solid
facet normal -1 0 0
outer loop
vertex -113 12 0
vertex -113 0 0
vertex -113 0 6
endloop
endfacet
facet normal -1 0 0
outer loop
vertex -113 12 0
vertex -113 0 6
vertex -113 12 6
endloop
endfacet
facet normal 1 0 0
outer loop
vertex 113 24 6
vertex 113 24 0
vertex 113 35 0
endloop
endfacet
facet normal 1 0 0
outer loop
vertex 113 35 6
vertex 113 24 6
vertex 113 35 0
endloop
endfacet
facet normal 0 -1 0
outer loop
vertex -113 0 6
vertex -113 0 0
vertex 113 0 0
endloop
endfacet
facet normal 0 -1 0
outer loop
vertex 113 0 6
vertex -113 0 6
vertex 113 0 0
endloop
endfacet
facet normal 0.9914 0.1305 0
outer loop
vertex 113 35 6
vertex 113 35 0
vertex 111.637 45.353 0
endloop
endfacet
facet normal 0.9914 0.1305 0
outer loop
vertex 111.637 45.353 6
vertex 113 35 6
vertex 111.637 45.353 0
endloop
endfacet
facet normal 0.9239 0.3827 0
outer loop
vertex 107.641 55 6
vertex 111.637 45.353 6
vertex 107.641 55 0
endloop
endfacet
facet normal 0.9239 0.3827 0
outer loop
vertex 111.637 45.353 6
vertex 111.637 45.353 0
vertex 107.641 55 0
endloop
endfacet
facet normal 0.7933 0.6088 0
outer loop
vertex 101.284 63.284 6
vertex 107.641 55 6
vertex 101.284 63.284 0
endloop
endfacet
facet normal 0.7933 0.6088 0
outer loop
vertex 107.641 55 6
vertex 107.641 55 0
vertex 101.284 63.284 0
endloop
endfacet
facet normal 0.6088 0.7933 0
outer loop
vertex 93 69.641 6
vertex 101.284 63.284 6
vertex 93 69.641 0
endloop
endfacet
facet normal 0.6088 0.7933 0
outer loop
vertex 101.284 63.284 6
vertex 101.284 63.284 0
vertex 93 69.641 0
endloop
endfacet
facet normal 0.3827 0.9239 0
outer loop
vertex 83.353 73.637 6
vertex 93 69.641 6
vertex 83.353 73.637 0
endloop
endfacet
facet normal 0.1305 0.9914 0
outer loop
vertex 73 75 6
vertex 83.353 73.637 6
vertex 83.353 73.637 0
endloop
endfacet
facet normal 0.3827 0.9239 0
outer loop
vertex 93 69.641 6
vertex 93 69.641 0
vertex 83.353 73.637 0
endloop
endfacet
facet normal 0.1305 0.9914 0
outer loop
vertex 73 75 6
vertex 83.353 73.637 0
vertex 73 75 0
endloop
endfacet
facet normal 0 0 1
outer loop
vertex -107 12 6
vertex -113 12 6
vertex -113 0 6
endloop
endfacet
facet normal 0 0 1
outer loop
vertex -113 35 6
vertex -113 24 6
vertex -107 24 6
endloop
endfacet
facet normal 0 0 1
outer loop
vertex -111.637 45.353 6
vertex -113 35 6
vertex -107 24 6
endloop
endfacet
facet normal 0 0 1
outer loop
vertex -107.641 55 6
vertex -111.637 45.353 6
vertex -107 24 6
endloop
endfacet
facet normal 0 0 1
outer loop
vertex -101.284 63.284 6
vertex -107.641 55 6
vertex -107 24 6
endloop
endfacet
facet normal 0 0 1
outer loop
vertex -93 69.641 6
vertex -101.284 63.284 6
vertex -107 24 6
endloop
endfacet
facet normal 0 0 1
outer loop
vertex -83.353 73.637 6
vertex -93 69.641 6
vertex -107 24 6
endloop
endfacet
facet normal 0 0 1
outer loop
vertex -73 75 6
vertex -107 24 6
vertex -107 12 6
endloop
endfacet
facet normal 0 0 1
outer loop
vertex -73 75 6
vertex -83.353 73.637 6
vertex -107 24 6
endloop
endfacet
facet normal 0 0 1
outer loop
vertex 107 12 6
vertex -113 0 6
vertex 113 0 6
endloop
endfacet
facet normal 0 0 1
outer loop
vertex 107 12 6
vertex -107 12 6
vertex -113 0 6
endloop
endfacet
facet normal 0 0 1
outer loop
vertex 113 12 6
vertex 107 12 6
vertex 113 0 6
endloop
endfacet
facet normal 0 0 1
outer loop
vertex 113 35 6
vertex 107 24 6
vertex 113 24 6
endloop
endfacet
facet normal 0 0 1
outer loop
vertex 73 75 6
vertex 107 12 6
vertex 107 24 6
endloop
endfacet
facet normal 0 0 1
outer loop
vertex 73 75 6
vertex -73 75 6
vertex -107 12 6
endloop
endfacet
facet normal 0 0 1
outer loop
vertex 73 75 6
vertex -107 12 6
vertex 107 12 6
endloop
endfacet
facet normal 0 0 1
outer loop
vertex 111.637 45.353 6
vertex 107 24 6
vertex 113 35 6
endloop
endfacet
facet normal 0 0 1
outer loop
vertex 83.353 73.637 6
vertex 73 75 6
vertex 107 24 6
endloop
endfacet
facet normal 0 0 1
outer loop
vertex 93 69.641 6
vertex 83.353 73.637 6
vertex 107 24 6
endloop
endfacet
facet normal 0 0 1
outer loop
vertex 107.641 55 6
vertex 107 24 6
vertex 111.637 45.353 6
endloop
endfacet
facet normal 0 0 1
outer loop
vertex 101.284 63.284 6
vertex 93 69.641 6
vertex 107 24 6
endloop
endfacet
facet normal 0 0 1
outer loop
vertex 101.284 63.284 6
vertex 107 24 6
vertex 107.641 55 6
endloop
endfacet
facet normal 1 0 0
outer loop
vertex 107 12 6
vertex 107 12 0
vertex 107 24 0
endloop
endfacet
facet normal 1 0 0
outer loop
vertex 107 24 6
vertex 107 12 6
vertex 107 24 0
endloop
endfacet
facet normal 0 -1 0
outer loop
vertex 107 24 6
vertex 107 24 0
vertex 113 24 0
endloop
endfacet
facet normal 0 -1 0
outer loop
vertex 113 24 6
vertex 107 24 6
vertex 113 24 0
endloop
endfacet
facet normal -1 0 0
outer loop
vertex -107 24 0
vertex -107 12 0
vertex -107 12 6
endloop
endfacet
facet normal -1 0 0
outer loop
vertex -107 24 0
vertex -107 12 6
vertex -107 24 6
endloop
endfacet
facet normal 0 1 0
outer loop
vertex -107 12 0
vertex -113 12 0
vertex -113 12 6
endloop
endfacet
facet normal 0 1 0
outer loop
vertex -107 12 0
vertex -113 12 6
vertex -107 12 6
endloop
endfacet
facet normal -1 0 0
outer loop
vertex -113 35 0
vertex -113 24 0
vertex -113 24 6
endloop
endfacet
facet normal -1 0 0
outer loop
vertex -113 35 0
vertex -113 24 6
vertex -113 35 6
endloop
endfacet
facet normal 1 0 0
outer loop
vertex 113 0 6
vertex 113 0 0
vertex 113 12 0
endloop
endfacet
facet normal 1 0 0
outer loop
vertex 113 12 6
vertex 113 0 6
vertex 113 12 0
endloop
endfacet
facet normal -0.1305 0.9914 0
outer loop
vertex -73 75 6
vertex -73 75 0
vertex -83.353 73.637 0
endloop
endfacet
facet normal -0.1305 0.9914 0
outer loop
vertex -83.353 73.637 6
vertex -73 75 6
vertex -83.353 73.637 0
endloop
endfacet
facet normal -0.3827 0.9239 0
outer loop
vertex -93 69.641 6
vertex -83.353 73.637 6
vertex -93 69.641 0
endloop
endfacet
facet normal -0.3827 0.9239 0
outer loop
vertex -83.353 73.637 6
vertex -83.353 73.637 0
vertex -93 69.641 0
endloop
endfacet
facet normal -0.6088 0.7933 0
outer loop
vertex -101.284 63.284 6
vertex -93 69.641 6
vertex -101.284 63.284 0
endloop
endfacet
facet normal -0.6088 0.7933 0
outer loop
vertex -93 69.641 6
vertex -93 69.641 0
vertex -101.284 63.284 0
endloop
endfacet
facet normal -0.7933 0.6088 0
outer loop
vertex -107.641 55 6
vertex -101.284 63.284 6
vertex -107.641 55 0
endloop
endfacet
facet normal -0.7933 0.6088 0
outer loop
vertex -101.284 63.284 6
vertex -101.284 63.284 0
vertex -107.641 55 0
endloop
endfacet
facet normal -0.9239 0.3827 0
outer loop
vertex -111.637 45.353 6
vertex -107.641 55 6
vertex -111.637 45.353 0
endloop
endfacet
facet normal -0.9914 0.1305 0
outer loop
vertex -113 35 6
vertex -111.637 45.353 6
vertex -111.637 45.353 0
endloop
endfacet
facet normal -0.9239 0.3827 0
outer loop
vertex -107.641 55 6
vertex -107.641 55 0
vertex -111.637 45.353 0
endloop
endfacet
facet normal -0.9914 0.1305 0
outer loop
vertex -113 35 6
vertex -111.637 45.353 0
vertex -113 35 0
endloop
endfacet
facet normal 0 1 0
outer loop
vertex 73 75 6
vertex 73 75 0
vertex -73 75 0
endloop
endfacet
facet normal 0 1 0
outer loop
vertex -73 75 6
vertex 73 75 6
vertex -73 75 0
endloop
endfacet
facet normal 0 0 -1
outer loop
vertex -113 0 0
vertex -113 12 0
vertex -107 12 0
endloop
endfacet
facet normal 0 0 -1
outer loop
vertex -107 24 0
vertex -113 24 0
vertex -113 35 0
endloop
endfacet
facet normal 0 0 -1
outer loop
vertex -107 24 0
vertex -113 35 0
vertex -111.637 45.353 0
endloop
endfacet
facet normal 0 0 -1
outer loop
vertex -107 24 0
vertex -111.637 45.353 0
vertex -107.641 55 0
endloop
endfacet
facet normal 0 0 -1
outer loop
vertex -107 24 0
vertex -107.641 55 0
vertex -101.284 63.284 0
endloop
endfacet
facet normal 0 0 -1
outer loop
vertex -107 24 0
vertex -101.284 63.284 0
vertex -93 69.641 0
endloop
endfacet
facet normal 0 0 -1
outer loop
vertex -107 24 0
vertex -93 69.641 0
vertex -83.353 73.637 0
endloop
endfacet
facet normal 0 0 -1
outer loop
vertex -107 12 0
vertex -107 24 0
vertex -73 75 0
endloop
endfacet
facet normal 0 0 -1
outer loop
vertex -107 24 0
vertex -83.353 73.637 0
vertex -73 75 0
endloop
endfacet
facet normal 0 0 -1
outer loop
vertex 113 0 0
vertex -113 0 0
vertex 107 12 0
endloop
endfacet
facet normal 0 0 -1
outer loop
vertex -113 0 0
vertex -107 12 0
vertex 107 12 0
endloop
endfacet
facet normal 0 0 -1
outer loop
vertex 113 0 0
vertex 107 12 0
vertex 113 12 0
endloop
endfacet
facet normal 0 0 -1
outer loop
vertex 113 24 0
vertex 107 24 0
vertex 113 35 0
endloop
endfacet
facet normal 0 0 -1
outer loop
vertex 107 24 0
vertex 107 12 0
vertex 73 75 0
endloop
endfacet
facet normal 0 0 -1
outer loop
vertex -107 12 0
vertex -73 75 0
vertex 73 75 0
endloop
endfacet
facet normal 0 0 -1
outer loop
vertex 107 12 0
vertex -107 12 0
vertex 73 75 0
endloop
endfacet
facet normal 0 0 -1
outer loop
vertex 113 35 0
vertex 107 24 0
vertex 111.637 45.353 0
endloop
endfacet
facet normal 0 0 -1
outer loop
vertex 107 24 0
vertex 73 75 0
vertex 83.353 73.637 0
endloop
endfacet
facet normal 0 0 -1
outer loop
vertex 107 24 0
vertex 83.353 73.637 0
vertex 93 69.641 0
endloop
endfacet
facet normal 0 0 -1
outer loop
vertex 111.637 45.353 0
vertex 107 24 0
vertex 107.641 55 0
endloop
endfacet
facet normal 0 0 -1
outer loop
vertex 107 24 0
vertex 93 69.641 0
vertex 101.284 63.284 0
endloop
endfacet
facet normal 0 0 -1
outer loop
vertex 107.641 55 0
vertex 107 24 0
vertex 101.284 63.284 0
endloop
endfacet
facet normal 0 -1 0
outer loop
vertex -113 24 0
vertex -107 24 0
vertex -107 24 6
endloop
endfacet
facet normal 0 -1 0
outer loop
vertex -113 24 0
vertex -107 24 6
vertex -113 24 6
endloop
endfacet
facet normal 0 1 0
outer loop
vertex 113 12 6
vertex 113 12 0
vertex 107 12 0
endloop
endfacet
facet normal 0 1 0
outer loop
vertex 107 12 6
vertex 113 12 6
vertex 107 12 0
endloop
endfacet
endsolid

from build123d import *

# Parameters (mm, degrees)
PAD_DEPTH = 6


with BuildPart() as part:
    # Sketch → Pad (new body)
    with BuildSketch(Plane.XY):
        with BuildLine():
            Line((0, 0), (113, 0))
            Line((113, 0), (113, 12))
            Line((113, 12), (107, 12))
            Line((107, 12), (107, 24))
            Line((107, 24), (113, 24))
            Line((113, 24), (113, 35))
            ThreePointArc((113, 35), (101.284271, 63.284271), (73, 75))
            Line((73, 75), (0, 75))
            Line((-73, 75), (0, 75))
            ThreePointArc((-73, 75), (-101.284271, 63.284271), (-113, 35))
            Line((-113, 24), (-113, 35))
            Line((-107, 24), (-113, 24))
            Line((-107, 12), (-107, 24))
            Line((-113, 12), (-107, 12))
            Line((-113, 0), (-113, 12))
            Line((0, 0), (-113, 0))
        make_face()
    extrude(amount=PAD_DEPTH)


solid = part.part
